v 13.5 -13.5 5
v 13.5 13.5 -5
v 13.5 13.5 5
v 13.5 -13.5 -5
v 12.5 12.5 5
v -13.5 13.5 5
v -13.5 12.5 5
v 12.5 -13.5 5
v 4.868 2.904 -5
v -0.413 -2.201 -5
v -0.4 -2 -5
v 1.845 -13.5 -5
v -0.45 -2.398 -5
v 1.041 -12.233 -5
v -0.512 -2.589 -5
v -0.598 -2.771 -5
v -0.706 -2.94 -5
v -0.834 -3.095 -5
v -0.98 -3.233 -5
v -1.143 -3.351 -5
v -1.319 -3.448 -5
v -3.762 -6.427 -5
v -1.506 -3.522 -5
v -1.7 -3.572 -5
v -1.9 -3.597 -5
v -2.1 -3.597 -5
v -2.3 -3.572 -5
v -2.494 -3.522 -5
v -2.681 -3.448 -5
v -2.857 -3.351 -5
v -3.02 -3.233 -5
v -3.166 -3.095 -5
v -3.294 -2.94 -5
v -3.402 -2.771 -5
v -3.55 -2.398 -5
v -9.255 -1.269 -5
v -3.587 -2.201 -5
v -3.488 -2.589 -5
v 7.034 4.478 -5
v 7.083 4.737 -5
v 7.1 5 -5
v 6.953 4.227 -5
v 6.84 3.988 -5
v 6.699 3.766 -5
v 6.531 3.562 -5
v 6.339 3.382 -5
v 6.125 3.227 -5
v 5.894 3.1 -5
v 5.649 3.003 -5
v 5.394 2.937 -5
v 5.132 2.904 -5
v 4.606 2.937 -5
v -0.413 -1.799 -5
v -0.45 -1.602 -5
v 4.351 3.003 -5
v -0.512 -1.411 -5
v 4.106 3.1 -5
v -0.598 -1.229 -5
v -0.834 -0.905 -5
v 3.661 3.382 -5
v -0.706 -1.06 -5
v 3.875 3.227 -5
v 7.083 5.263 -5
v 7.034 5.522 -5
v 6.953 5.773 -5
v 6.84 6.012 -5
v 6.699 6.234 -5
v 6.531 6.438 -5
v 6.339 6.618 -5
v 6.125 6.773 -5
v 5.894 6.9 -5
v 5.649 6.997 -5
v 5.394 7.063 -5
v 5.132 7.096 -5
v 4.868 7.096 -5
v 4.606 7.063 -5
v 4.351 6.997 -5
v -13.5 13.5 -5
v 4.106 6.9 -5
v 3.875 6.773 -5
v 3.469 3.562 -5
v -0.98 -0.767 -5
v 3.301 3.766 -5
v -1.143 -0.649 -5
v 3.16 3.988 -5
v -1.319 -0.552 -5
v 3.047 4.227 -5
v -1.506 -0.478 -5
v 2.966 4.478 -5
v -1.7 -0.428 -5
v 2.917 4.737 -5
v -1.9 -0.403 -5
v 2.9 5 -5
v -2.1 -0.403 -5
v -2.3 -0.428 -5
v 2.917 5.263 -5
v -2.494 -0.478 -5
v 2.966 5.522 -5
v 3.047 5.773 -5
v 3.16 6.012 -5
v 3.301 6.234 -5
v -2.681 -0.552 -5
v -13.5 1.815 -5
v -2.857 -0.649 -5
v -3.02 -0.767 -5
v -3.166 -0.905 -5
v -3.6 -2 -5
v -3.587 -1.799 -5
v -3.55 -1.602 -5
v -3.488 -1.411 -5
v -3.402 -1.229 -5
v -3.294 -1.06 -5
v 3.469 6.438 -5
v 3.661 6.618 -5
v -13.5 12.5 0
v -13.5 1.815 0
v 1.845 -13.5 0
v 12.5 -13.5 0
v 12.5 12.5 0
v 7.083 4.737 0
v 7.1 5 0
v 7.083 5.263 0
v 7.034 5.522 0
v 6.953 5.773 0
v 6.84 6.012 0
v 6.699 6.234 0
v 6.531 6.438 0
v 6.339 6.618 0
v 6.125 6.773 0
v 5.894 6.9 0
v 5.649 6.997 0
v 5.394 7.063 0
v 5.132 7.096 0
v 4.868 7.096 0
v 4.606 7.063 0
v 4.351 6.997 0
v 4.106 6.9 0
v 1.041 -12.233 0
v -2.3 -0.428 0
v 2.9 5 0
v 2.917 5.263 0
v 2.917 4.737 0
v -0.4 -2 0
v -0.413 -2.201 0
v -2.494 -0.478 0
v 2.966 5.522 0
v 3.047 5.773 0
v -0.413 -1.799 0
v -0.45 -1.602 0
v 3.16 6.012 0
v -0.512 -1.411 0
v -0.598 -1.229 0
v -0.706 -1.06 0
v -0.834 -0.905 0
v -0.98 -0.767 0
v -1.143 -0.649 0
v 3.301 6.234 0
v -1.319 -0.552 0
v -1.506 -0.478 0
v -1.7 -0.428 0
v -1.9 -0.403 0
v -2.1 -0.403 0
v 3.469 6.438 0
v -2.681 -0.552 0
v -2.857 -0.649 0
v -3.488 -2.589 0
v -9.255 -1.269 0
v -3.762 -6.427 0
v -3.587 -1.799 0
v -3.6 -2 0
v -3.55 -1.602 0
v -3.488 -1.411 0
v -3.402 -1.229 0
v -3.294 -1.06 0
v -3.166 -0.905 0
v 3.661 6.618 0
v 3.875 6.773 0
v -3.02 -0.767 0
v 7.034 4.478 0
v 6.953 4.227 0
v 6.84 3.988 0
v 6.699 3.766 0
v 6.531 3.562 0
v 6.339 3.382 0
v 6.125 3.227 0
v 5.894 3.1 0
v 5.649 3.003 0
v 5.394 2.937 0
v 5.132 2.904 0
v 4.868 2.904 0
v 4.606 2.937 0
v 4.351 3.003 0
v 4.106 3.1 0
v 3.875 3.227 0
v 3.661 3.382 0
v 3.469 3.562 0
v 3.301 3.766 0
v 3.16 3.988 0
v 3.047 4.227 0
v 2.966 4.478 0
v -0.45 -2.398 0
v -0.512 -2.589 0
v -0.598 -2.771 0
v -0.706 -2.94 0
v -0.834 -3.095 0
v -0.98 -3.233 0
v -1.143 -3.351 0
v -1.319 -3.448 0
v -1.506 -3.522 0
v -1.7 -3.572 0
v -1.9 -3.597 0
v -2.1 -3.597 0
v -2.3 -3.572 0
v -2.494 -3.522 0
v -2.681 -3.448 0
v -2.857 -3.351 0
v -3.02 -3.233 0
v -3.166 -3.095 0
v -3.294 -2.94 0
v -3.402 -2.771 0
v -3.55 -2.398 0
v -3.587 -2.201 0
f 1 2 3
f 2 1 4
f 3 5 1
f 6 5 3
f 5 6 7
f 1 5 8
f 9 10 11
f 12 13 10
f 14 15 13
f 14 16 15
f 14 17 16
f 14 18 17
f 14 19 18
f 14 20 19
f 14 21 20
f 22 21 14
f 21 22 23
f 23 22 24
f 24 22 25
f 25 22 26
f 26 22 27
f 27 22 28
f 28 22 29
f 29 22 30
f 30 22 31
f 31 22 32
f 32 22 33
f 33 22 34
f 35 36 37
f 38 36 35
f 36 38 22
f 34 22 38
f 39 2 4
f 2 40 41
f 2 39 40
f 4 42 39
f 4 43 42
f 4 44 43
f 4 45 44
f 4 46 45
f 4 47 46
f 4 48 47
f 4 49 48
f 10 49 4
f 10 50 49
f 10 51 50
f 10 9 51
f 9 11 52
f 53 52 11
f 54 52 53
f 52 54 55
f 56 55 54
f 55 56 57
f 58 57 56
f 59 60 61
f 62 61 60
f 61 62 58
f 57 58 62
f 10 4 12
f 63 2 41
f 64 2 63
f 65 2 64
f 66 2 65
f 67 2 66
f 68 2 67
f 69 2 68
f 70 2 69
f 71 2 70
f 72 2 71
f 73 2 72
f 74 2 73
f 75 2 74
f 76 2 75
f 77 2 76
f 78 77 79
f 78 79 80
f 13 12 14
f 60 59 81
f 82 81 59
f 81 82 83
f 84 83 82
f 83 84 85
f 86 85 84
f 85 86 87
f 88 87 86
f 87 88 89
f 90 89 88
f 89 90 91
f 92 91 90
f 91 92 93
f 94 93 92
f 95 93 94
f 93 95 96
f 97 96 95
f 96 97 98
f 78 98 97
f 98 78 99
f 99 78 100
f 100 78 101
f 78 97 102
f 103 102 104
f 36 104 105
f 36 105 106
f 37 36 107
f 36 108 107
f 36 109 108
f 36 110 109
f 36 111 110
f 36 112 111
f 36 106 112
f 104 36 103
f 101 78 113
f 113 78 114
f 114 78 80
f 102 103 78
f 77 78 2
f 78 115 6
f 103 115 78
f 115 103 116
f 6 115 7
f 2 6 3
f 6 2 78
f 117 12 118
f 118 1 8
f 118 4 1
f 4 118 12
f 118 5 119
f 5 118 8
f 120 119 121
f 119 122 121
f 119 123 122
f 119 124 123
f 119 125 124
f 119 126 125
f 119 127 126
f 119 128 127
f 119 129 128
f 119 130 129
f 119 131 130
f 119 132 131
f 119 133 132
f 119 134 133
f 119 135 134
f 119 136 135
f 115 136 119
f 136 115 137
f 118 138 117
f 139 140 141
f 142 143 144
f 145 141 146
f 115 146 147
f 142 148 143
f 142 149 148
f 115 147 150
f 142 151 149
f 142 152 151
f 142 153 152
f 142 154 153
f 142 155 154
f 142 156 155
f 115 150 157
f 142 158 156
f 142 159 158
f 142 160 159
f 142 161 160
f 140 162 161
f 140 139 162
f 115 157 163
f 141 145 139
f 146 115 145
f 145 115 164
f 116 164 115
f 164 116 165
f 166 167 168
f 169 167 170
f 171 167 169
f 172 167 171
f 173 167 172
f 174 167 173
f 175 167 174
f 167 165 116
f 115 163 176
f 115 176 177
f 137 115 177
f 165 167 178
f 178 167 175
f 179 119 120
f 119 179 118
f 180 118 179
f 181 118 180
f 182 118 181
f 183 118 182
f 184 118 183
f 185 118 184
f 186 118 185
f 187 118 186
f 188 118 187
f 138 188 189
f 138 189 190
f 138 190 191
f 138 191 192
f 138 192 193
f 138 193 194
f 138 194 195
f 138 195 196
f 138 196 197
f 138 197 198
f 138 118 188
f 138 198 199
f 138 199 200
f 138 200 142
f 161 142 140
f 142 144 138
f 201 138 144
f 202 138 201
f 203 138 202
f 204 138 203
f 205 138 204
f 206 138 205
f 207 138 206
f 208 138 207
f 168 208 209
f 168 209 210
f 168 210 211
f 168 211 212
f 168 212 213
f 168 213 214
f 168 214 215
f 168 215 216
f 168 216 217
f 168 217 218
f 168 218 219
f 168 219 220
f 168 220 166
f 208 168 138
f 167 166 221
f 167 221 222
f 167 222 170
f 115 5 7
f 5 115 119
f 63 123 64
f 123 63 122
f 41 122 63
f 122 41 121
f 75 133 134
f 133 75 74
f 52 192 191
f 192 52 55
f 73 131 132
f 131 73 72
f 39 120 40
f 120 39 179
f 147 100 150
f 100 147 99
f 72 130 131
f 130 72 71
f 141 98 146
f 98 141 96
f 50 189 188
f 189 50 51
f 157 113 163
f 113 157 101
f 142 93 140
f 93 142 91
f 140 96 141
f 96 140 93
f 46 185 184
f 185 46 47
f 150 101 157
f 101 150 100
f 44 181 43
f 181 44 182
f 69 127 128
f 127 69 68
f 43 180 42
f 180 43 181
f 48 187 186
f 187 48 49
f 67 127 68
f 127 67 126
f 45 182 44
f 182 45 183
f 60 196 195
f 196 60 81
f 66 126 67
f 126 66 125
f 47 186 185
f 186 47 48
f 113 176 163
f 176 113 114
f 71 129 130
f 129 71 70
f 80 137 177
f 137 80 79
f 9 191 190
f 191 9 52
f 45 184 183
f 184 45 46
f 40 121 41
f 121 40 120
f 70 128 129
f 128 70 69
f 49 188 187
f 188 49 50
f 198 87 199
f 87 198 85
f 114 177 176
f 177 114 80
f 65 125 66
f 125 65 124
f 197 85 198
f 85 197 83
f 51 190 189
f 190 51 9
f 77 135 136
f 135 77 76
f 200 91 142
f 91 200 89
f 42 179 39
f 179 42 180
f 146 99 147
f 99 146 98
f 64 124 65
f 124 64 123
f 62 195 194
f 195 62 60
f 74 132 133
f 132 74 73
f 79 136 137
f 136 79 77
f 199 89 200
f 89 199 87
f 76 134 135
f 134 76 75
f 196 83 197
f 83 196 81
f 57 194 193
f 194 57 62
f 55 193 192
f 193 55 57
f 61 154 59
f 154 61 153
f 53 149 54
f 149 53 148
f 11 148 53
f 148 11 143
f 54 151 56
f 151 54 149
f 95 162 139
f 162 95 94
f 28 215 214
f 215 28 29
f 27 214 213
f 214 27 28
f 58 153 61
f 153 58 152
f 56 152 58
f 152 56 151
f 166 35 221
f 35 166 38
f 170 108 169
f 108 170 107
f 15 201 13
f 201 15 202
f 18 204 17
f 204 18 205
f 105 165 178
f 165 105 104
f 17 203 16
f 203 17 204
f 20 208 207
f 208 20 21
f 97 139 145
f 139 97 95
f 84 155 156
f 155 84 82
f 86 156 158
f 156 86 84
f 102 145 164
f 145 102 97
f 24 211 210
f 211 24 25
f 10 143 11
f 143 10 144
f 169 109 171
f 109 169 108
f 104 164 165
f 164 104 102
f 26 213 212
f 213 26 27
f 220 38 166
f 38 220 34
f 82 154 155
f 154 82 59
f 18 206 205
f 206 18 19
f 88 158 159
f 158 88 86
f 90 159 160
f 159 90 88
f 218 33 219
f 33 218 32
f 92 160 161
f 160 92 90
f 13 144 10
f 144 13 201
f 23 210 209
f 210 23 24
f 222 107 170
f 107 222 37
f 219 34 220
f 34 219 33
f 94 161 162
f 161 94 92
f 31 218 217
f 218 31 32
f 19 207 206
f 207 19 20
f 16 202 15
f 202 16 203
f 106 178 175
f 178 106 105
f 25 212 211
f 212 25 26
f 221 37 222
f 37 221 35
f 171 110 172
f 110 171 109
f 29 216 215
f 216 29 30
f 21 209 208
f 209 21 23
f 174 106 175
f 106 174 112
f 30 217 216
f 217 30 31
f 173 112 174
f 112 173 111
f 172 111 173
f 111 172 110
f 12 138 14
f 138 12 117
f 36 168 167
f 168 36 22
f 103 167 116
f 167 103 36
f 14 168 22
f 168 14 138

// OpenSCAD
// corner fan mounts


fan_dia = 120;

m4_dia = 4.2;
m4_pilot = 3.2;
m4_head_dia = 9.25;


// mount z must be between 4.5 & 6 due to the screws going into radiator
// before they bottom out
mount_z = 5;
mount_lip_z = 5;
mount_lip_x = 2;

inside_square = 25;
outside_square = 25 + mount_lip_x;
outside_square_z = mount_z + mount_lip_z;


$fn = 50;

difference () {

    {
    cube([outside_square, outside_square, outside_square_z], center = true);
    }

    {
    // cube for the lip
    translate([0,0, mount_z/2])
    cube([inside_square, inside_square, mount_lip_z], center = true);
        
    // radiator mount
    translate([inside_square/2 - 7.5, inside_square/2 - 7.5, -outside_square_z/2 + mount_z/2])
    #cylinder(r = m4_dia/2, h = mount_z, center = true);
        
    // threaded hole
    translate([inside_square/2 - (7.5 + 7.0), 
        inside_square/2 - (7.5 + 7.0), 
        -outside_square_z/2 + mount_z/2])
    cylinder(r = m4_pilot/2, h = mount_z, center = true);  
    
    // airflow 
    translate([-(fan_dia/2 - inside_square/2), -(fan_dia/2 - inside_square/2),0])
    cylinder(r = fan_dia/2, h = outside_square_z, center = true);    
        
    // unneed lip!
    translate([-(outside_square/2 - mount_lip_x/2),0, mount_z/2])
    cube([mount_lip_x, inside_square, mount_lip_z], center = true);
    
    translate([0, -(outside_square/2 - mount_lip_x/2), mount_z/2])
    # cube([inside_square, mount_lip_x,  mount_lip_z], center = true);
    }
}
